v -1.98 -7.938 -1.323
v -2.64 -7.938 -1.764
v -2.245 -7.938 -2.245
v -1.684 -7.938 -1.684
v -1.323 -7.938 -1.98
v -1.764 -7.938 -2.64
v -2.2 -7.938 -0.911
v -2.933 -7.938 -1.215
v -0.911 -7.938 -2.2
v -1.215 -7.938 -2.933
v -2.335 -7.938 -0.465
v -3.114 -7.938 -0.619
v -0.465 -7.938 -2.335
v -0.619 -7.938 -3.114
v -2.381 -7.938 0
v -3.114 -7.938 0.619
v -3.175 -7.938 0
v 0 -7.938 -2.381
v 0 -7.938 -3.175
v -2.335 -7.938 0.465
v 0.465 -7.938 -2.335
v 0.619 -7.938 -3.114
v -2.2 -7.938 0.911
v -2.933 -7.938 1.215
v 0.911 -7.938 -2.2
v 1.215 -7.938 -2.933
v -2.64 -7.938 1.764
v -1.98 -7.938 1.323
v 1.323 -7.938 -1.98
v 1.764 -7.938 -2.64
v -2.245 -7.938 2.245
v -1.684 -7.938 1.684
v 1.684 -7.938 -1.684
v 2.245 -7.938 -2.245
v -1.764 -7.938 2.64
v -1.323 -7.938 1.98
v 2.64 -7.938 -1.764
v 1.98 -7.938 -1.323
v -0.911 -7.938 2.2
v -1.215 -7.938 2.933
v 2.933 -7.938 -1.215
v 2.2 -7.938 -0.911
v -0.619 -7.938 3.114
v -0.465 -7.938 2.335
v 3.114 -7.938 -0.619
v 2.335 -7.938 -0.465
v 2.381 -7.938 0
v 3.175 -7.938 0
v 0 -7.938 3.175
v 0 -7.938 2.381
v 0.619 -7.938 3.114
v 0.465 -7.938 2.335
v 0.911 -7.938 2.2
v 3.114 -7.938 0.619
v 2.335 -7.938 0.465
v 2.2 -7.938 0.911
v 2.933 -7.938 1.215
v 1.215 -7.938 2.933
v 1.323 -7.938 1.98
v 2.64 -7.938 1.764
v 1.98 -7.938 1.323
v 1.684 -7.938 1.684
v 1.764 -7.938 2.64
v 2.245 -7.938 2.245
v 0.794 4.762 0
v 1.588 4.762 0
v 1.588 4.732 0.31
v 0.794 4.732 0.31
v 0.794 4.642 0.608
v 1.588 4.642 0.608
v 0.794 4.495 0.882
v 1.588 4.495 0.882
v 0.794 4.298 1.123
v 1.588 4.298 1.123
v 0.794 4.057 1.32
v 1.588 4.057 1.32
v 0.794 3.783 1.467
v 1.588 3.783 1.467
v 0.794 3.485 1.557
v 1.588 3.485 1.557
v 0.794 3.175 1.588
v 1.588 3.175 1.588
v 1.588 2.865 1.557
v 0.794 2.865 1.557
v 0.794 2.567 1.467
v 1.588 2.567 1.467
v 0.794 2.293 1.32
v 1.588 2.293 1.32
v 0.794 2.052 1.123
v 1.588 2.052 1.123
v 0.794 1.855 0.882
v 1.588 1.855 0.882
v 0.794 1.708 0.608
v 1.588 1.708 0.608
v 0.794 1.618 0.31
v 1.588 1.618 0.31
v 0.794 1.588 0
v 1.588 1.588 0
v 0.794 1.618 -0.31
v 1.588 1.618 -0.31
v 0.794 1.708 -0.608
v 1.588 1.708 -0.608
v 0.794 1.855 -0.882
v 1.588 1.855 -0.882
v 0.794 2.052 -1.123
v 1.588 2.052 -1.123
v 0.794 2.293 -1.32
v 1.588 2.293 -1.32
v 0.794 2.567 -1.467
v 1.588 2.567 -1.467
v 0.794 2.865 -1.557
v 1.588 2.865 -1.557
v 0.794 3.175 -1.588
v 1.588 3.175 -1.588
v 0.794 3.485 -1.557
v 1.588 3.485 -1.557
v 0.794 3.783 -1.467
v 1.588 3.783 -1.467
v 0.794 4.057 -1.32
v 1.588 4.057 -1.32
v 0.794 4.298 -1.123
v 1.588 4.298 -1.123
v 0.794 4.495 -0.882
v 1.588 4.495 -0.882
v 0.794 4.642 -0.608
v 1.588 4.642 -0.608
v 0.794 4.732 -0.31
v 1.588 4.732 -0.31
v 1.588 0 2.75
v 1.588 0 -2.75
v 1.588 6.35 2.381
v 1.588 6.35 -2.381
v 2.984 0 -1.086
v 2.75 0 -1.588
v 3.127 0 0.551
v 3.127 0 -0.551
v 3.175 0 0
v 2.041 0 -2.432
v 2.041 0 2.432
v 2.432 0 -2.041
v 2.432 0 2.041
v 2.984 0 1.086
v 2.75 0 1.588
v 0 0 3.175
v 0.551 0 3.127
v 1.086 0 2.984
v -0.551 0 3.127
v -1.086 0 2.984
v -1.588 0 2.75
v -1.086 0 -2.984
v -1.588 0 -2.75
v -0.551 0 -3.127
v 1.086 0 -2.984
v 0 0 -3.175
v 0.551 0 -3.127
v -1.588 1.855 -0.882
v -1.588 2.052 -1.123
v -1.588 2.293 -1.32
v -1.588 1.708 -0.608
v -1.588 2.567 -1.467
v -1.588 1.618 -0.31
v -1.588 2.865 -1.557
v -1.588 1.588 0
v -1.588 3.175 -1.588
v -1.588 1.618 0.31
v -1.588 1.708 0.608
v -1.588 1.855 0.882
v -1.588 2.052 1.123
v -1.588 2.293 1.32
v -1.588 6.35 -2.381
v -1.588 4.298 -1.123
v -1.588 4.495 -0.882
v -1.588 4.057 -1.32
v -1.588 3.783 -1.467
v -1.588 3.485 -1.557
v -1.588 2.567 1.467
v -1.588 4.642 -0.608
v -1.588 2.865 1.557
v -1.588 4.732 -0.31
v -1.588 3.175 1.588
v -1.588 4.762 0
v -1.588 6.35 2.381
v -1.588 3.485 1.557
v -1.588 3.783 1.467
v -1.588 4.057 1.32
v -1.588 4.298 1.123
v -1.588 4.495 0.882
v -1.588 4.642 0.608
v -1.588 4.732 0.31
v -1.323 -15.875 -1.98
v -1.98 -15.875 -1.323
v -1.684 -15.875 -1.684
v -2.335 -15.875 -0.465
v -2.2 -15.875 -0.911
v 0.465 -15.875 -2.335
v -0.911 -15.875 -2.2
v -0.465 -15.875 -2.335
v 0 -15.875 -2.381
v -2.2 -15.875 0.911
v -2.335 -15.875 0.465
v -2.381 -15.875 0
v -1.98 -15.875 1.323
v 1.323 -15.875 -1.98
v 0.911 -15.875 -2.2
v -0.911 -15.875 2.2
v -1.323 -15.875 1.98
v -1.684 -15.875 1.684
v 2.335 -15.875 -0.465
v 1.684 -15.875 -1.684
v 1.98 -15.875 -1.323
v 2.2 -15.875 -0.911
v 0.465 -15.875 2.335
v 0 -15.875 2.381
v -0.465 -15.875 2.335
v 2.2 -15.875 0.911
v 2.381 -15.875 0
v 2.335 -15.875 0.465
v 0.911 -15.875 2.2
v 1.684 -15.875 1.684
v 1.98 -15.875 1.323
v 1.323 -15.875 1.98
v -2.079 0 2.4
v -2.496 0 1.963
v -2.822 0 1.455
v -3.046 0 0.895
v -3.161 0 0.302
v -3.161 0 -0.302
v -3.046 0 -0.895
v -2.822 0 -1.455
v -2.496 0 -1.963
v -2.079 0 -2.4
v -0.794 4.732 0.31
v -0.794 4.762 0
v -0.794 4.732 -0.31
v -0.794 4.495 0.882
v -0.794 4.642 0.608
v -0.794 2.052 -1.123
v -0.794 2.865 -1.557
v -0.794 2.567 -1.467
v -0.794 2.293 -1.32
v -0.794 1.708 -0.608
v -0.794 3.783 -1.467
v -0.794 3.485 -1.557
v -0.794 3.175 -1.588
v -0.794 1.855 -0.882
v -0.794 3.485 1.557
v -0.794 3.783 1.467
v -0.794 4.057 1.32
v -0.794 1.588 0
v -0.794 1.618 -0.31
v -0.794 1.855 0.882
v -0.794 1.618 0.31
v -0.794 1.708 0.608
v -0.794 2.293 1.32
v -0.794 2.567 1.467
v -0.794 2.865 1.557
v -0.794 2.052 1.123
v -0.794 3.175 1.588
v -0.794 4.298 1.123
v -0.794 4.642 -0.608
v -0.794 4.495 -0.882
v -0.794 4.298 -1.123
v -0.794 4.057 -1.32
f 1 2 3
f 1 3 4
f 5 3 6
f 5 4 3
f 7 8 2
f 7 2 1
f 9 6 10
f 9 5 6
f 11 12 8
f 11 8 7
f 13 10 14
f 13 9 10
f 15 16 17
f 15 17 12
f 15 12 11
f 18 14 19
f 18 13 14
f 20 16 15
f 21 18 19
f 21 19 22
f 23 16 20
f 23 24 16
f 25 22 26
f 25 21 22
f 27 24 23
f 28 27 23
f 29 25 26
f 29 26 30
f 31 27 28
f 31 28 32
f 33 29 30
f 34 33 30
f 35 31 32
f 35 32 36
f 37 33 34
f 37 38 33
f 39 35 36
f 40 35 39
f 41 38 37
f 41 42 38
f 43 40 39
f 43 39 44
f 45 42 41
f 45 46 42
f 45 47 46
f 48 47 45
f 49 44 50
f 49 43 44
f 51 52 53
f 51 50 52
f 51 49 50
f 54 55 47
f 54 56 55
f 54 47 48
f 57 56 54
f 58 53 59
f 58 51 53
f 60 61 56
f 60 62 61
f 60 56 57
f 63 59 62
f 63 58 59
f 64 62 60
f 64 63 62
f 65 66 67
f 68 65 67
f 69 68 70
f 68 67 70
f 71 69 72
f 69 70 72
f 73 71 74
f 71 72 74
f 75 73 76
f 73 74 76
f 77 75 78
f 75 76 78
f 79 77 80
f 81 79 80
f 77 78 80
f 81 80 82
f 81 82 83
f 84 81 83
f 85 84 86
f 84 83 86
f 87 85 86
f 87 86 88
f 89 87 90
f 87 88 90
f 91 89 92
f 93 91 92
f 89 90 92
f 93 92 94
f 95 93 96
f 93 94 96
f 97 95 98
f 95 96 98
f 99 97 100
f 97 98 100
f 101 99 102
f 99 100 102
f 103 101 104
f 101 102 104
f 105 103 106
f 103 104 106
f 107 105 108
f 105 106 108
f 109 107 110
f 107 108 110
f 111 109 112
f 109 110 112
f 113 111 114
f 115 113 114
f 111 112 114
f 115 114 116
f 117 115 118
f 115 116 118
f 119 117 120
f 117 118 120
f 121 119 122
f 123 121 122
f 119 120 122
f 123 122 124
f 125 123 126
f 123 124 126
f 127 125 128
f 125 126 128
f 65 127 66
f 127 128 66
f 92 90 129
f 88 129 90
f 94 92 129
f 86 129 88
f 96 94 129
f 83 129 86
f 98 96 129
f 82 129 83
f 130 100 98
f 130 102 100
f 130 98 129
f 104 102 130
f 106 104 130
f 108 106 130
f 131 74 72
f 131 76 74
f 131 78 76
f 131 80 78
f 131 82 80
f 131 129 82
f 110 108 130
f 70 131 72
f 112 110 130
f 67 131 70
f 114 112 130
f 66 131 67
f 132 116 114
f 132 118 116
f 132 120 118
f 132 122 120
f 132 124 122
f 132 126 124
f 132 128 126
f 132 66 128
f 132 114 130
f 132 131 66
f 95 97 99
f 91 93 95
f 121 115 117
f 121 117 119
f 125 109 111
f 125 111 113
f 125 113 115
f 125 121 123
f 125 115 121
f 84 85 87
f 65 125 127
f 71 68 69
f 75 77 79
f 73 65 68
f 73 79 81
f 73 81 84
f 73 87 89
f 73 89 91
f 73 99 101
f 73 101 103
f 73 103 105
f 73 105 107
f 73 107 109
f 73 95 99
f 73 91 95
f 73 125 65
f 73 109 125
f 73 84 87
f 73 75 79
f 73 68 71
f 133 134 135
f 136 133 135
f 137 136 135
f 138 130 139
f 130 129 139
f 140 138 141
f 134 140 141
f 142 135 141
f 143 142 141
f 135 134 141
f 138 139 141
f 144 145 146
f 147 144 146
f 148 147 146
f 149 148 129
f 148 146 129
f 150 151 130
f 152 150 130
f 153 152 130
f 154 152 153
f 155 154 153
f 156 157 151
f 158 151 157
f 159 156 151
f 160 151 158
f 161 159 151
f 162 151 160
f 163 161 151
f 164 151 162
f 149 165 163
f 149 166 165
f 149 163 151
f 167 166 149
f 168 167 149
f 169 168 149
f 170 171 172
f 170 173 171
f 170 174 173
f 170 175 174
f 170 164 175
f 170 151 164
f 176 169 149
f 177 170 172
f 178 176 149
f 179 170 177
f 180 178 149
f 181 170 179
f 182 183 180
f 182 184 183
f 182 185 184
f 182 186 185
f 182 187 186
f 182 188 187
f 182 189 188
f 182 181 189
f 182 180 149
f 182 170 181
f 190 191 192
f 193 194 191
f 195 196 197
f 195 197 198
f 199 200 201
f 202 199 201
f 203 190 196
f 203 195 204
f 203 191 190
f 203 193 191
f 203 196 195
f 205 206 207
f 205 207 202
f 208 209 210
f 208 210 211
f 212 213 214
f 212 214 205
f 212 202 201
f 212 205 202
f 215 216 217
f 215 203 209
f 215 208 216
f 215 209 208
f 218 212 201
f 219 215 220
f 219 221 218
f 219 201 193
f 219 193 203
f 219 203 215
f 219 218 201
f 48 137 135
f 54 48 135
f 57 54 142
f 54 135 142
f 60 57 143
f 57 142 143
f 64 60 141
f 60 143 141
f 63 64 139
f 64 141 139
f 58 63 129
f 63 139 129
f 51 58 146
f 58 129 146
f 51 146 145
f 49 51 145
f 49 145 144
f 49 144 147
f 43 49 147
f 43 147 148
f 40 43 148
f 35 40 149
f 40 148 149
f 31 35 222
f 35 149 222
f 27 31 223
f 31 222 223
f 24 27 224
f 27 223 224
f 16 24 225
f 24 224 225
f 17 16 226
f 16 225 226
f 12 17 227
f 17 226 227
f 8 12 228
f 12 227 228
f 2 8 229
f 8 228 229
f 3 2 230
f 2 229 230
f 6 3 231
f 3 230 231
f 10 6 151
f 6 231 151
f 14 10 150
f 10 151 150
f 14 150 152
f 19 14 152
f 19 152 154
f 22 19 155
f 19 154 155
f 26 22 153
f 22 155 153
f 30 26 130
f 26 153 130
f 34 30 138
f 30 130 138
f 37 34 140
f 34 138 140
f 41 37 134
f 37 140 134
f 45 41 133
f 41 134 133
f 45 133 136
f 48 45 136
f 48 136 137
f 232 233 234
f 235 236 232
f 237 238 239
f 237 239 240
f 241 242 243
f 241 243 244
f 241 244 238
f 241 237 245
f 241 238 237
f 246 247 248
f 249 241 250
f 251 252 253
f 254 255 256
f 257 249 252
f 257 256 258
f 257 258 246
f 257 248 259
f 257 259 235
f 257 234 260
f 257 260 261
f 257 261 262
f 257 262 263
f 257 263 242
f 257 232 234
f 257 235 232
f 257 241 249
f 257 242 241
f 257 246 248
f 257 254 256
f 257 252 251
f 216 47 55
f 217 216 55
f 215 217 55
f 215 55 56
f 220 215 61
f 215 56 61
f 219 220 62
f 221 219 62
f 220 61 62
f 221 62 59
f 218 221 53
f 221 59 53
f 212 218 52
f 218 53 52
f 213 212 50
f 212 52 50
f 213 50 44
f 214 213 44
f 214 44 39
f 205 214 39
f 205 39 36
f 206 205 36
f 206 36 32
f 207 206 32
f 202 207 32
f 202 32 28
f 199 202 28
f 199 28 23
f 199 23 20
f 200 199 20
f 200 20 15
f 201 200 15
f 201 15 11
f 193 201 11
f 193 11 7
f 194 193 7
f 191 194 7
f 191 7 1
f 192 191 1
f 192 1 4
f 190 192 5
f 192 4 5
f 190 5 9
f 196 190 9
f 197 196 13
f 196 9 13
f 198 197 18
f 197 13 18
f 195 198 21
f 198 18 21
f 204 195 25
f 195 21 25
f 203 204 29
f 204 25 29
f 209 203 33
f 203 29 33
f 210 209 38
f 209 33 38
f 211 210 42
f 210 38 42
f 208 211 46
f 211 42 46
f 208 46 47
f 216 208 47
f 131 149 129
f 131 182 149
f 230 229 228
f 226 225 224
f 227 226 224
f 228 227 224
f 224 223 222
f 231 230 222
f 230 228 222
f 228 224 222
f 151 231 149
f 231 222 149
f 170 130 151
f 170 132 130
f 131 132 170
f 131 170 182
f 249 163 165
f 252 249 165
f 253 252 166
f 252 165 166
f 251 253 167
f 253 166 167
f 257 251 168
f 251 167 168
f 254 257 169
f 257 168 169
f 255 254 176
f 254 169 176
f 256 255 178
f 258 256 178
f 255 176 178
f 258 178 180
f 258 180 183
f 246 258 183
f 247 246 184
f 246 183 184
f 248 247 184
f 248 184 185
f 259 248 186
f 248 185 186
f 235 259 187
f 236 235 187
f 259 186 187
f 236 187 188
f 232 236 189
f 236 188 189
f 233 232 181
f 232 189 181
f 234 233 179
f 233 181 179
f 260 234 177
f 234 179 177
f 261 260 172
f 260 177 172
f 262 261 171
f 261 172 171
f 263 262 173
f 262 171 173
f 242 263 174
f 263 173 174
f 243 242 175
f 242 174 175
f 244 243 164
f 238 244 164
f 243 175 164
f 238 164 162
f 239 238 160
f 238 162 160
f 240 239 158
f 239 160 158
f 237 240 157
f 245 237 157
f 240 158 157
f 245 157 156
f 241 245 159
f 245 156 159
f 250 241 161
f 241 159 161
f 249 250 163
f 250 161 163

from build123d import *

# Parameters (mm, degrees)
F0_R      = 3.175
F0_R_2    = 2.38125
F1_DEPTH  = 7.9375
F2_DEPTH  = 15.875
F3_W      = 3.175
F3_H      = 5.499262
F5_W      = 3.175
F5_H      = 4.7625
F7_R      = 1.5875
F8_DEPTH  = 0.79375
F9_R      = 1.5875
F10_DEPTH = 0.79375


with BuildPart() as f1:
    # F0 (on Front) → F1 (new body)
    with BuildSketch(Plane.XZ):
        Circle(F0_R)
        Circle(F0_R_2, mode=Mode.SUBTRACT)
    extrude(amount=F1_DEPTH)

    # F0 (on Front) → F2 (join)
    with BuildSketch(Plane.XZ):
        Circle(F0_R_2)
    extrude(amount=F2_DEPTH)

    # F3 (on face) → F6 section 0
    with BuildSketch(Plane(origin=(0, 0, 0), x_dir=(-1, 0, 0), z_dir=(0, 1, 0))):
        Rectangle(F3_W, F3_H)
    # F5 (on offset) → F6 section 1
    with BuildSketch(Plane(origin=(0, 6.35, 0), x_dir=(-1, 0, 0), z_dir=(0, 1, 0))):
        Rectangle(F5_W, F5_H)
    loft()

    # F7 (on face) → F8 (cut)
    with BuildSketch(Plane.YZ.offset(1.5875)):
        with Locations((3.175, 0)):
            Circle(F7_R)
    extrude(amount=-F8_DEPTH, mode=Mode.SUBTRACT)

    # F9 (on face) → F10 (cut)
    with BuildSketch(Plane(origin=(-1.5875, 0, 0), x_dir=(0, -1, 0), z_dir=(-1, 0, 0))):
        with Locations((-3.175, 0)):
            Circle(F9_R)
    extrude(amount=-F10_DEPTH, mode=Mode.SUBTRACT)


solid = f1.part
